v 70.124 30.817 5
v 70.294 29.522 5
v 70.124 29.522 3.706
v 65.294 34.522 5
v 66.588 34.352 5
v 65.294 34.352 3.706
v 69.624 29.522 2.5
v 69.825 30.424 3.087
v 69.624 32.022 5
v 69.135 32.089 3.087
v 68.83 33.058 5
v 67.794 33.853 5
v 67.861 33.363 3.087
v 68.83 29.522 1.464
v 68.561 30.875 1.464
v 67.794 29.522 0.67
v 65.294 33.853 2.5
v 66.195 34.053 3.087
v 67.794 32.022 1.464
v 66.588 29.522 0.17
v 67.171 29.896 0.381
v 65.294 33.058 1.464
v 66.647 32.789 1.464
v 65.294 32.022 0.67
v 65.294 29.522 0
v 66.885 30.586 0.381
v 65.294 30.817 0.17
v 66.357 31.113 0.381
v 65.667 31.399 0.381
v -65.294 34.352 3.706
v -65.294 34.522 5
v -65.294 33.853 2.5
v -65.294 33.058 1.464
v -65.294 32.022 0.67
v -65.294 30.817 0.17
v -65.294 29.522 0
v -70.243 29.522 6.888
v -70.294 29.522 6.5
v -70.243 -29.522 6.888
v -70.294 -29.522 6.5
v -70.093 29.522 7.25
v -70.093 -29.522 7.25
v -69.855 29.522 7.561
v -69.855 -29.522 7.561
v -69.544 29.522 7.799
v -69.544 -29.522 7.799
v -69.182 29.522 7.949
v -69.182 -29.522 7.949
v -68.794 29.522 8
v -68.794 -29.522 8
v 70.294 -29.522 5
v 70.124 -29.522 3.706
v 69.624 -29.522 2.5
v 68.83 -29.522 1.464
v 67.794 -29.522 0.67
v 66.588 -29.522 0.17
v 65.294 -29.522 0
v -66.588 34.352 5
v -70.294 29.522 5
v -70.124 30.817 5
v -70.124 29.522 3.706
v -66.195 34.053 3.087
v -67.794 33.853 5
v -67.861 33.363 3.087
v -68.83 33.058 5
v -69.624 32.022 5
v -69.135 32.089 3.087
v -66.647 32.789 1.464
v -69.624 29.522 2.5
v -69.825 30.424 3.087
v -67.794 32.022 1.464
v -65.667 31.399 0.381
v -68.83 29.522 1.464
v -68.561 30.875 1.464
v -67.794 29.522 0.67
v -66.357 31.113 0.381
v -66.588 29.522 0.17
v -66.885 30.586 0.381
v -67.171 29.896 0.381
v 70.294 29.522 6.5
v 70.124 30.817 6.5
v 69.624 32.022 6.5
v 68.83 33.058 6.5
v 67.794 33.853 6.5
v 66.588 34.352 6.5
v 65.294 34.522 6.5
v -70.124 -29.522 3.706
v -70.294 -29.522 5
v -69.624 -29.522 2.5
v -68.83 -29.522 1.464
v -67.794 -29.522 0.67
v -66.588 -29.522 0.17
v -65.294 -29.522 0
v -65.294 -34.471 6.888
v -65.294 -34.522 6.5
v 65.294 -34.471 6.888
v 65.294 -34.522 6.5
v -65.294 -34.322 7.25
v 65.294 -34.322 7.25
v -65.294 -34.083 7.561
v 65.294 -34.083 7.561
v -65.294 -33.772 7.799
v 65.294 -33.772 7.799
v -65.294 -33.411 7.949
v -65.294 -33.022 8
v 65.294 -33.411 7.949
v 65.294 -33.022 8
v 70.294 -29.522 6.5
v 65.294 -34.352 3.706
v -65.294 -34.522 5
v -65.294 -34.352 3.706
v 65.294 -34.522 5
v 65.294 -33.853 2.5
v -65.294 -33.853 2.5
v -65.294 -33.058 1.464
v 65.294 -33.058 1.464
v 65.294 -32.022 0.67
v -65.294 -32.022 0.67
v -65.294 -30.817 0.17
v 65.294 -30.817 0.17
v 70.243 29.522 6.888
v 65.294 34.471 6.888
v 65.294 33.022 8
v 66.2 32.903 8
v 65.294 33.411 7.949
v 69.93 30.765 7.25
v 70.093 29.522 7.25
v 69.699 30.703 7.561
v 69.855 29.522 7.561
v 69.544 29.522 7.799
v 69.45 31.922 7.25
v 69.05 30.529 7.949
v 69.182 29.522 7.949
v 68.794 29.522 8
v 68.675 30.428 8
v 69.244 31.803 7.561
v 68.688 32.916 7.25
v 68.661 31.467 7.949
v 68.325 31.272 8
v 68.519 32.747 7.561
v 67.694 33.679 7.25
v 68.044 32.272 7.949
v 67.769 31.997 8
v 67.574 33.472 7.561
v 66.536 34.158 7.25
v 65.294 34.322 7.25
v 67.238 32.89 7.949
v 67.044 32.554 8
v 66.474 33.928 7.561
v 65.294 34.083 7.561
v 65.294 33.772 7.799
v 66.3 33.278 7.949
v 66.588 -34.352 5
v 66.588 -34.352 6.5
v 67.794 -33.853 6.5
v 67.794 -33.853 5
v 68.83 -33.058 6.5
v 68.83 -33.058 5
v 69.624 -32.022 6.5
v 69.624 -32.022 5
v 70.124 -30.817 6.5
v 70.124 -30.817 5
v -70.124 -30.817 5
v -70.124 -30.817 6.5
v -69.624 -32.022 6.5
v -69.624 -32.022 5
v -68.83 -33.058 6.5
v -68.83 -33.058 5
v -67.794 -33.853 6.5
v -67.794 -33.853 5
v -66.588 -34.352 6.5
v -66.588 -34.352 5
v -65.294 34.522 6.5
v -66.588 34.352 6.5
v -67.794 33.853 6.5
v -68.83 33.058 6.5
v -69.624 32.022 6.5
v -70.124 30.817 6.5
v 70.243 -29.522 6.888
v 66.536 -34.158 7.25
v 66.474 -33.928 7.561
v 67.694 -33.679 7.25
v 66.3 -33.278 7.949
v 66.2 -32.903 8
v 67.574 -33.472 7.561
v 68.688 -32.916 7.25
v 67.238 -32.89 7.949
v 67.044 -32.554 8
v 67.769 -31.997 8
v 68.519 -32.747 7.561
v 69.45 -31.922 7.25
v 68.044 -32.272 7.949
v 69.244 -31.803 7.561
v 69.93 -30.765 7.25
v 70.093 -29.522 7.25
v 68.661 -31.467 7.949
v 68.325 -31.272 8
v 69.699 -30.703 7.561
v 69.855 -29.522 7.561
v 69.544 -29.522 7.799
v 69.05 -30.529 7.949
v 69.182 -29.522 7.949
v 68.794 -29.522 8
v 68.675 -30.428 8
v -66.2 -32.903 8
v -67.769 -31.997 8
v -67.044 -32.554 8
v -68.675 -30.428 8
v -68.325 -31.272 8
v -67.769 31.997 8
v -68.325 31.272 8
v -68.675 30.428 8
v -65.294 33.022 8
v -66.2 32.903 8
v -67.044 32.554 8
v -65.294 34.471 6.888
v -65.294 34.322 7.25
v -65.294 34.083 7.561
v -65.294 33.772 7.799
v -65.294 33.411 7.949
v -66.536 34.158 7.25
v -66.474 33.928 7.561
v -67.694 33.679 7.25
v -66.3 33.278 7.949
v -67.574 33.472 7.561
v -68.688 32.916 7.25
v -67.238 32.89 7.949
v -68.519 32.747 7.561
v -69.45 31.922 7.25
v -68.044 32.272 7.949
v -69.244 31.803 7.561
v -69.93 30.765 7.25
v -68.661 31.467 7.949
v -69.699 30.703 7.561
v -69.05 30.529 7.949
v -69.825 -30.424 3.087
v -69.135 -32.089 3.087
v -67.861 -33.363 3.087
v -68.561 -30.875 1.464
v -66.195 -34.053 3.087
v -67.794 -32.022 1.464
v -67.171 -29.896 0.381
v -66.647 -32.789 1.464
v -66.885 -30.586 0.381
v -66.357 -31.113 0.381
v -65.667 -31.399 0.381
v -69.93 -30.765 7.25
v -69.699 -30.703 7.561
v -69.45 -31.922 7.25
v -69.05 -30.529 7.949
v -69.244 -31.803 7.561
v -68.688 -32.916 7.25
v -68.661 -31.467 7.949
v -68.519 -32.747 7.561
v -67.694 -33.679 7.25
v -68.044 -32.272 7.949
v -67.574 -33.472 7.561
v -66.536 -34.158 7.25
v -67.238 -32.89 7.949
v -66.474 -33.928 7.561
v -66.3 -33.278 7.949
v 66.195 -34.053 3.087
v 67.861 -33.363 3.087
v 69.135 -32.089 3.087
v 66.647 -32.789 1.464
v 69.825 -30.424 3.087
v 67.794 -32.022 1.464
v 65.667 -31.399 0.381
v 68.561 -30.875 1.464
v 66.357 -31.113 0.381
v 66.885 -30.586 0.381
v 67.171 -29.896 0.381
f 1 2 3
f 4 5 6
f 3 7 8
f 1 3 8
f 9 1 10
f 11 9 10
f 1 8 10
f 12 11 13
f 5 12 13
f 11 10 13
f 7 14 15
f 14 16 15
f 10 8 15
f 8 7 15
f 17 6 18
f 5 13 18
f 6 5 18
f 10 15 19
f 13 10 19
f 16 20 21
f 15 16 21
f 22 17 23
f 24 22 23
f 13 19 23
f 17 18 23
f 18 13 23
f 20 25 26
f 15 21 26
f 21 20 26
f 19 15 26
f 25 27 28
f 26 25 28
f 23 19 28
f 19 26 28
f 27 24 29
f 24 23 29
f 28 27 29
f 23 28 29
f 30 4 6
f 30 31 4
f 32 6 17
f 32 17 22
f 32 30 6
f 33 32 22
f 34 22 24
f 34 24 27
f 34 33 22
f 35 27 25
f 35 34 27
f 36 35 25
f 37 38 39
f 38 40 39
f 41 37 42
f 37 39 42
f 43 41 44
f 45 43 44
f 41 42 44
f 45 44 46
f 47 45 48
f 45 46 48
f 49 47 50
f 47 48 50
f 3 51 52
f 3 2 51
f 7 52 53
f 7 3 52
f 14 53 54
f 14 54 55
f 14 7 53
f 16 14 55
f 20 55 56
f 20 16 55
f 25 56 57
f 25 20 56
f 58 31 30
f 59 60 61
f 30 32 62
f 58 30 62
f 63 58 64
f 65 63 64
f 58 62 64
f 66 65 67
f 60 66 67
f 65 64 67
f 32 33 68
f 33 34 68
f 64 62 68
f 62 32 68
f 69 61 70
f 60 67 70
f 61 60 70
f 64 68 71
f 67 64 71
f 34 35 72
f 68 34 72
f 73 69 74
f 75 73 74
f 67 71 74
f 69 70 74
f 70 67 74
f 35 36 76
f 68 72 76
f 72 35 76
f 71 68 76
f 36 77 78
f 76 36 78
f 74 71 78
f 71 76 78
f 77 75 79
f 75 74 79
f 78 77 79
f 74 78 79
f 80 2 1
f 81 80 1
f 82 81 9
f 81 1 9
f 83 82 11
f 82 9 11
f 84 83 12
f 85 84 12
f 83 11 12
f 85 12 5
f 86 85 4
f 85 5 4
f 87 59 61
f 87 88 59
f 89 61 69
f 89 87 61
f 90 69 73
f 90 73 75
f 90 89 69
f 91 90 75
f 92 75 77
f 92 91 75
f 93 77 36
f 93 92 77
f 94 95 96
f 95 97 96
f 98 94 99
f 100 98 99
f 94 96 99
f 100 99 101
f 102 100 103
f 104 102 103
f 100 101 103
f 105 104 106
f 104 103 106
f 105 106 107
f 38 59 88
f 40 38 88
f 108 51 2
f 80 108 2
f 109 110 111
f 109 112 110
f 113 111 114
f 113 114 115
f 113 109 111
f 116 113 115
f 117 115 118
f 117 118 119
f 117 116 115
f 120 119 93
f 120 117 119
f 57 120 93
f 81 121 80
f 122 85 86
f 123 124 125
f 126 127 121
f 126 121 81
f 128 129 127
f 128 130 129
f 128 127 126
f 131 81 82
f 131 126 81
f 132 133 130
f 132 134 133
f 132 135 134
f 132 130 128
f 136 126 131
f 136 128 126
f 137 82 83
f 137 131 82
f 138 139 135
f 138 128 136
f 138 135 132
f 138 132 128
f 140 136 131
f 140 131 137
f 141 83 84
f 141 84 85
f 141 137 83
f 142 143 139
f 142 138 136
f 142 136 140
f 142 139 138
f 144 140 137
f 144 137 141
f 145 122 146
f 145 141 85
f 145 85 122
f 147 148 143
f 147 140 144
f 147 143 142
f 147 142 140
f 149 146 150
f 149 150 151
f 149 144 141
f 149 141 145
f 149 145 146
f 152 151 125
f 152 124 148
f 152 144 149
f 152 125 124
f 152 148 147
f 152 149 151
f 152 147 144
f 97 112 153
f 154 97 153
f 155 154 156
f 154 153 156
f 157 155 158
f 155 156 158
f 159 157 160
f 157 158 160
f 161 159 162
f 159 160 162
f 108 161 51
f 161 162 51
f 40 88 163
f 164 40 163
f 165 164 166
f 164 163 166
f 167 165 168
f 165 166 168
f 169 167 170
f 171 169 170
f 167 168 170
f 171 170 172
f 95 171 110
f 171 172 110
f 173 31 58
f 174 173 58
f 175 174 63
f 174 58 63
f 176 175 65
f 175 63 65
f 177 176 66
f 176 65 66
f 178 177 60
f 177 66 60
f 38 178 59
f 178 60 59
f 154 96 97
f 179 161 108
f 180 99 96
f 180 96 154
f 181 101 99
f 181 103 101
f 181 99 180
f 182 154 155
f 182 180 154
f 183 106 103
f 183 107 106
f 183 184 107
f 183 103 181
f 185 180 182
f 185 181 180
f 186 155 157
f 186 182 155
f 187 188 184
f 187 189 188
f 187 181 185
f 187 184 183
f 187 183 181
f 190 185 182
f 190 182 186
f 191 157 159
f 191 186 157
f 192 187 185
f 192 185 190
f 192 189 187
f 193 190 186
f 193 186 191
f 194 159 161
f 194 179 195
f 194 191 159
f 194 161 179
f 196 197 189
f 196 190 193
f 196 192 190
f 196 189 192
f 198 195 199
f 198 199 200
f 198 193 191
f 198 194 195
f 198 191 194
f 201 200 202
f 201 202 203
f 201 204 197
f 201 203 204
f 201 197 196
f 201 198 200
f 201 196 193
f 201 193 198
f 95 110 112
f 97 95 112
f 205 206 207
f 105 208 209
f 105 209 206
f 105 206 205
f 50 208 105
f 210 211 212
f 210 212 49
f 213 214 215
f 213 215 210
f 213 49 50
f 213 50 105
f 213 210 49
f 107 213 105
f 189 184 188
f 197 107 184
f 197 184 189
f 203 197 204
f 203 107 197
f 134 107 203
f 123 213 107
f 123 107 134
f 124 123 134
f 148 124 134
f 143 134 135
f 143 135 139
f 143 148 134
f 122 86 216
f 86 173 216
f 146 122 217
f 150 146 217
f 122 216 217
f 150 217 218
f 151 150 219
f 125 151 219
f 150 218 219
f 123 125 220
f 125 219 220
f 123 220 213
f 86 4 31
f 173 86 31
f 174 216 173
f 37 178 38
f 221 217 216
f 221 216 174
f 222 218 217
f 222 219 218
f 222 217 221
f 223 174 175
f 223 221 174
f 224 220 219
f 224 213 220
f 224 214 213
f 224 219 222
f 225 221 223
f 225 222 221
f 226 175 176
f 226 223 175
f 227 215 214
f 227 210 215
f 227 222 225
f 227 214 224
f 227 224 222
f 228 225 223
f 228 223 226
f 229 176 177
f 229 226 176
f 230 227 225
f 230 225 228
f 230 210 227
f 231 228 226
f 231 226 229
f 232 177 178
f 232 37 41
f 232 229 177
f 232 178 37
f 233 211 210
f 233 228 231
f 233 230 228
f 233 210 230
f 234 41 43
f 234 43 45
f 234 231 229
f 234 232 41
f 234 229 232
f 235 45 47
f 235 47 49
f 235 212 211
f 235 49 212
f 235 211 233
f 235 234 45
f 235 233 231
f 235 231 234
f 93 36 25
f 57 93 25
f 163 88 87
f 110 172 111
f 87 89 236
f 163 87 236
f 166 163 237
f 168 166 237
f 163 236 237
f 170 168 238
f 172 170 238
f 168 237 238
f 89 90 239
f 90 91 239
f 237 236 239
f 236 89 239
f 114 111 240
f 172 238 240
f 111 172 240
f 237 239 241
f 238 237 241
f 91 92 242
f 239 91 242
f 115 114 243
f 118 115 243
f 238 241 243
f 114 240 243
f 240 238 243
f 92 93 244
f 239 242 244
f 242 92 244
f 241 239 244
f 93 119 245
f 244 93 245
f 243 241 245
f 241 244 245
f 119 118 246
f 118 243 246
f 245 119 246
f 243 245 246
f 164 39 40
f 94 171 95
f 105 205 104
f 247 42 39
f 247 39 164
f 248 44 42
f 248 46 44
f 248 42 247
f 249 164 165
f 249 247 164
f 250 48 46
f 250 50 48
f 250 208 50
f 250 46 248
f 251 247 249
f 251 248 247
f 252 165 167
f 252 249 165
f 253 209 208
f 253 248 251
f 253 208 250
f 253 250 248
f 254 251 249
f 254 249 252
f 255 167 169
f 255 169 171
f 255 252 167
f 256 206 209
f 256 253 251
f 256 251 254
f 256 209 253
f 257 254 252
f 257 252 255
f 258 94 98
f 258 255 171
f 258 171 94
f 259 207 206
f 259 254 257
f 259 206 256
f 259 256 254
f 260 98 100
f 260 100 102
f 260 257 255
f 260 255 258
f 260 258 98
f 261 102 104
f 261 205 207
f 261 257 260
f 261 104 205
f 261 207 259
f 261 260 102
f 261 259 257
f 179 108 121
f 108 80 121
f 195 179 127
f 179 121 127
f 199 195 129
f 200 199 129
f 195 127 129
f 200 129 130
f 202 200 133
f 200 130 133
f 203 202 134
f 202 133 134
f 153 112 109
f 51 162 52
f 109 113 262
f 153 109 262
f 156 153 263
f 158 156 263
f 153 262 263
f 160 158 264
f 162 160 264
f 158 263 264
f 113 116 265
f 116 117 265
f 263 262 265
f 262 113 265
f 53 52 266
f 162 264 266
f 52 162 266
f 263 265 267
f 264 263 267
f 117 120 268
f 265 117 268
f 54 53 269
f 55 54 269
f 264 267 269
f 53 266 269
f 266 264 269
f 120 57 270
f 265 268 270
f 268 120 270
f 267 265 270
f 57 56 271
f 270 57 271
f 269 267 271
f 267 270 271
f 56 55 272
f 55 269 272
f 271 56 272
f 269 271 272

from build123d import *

# Parameters (mm, degrees)
F1_DEPTH = 8
F2_R     = 1.5
F3_R     = 5


with BuildPart() as f1:
    # F0 (on Top) → F1 (new body)
    with BuildSketch(Plane.XY):
        with BuildLine():
            Line((65.2941119671, 34.5224887133), (-65.2941119671, 34.5224887133))
            ThreePointArc((-65.2941119671, 34.5224887133), (-68.829645873, 33.0580226192), (-70.2941119671, 29.5224887133))
            Line((-70.2941119671, 29.5224887133), (-70.2941119671, -29.5224887133))
            ThreePointArc((-70.2941119671, -29.5224887133), (-68.829645873, -33.0580226192), (-65.2941119671, -34.5224887133))
            Line((-65.2941119671, -34.5224887133), (65.2941119671, -34.5224887133))
            ThreePointArc((65.2941119671, -34.5224887133), (68.829645873, -33.0580226192), (70.2941119671, -29.5224887133))
            Line((70.2941119671, -29.5224887133), (70.2941119671, 29.5224887133))
            ThreePointArc((70.2941119671, 29.5224887133), (68.829645873, 33.0580226192), (65.2941119671, 34.5224887133))
        make_face()
    extrude(amount=F1_DEPTH)

    # F2
    f2_edges = [f1.edges().sort_by_distance(p)[0] for p in [
        (0, 34.522489, 8),
        (-68.829646, 33.058023, 8),
        (-70.294112, 0, 8),
        (-68.829646, -33.058023, 8),
        (0, -34.522489, 8),
        (68.829646, -33.058023, 8),
        (70.294112, 0, 8),
        (68.829646, 33.058023, 8),
    ]]
    fillet(f2_edges, radius=F2_R)

    # F3
    f3_edges = [f1.edges().sort_by_distance(p)[0] for p in [
        (0, 34.522489, 0),
        (-68.829646, 33.058023, 0),
        (-70.294112, 0, 0),
        (-68.829646, -33.058023, 0),
        (0, -34.522489, 0),
        (68.829646, -33.058023, 0),
        (70.294112, 0, 0),
        (68.829646, 33.058023, 0),
    ]]
    fillet(f3_edges, radius=F3_R)


solid = f1.part
